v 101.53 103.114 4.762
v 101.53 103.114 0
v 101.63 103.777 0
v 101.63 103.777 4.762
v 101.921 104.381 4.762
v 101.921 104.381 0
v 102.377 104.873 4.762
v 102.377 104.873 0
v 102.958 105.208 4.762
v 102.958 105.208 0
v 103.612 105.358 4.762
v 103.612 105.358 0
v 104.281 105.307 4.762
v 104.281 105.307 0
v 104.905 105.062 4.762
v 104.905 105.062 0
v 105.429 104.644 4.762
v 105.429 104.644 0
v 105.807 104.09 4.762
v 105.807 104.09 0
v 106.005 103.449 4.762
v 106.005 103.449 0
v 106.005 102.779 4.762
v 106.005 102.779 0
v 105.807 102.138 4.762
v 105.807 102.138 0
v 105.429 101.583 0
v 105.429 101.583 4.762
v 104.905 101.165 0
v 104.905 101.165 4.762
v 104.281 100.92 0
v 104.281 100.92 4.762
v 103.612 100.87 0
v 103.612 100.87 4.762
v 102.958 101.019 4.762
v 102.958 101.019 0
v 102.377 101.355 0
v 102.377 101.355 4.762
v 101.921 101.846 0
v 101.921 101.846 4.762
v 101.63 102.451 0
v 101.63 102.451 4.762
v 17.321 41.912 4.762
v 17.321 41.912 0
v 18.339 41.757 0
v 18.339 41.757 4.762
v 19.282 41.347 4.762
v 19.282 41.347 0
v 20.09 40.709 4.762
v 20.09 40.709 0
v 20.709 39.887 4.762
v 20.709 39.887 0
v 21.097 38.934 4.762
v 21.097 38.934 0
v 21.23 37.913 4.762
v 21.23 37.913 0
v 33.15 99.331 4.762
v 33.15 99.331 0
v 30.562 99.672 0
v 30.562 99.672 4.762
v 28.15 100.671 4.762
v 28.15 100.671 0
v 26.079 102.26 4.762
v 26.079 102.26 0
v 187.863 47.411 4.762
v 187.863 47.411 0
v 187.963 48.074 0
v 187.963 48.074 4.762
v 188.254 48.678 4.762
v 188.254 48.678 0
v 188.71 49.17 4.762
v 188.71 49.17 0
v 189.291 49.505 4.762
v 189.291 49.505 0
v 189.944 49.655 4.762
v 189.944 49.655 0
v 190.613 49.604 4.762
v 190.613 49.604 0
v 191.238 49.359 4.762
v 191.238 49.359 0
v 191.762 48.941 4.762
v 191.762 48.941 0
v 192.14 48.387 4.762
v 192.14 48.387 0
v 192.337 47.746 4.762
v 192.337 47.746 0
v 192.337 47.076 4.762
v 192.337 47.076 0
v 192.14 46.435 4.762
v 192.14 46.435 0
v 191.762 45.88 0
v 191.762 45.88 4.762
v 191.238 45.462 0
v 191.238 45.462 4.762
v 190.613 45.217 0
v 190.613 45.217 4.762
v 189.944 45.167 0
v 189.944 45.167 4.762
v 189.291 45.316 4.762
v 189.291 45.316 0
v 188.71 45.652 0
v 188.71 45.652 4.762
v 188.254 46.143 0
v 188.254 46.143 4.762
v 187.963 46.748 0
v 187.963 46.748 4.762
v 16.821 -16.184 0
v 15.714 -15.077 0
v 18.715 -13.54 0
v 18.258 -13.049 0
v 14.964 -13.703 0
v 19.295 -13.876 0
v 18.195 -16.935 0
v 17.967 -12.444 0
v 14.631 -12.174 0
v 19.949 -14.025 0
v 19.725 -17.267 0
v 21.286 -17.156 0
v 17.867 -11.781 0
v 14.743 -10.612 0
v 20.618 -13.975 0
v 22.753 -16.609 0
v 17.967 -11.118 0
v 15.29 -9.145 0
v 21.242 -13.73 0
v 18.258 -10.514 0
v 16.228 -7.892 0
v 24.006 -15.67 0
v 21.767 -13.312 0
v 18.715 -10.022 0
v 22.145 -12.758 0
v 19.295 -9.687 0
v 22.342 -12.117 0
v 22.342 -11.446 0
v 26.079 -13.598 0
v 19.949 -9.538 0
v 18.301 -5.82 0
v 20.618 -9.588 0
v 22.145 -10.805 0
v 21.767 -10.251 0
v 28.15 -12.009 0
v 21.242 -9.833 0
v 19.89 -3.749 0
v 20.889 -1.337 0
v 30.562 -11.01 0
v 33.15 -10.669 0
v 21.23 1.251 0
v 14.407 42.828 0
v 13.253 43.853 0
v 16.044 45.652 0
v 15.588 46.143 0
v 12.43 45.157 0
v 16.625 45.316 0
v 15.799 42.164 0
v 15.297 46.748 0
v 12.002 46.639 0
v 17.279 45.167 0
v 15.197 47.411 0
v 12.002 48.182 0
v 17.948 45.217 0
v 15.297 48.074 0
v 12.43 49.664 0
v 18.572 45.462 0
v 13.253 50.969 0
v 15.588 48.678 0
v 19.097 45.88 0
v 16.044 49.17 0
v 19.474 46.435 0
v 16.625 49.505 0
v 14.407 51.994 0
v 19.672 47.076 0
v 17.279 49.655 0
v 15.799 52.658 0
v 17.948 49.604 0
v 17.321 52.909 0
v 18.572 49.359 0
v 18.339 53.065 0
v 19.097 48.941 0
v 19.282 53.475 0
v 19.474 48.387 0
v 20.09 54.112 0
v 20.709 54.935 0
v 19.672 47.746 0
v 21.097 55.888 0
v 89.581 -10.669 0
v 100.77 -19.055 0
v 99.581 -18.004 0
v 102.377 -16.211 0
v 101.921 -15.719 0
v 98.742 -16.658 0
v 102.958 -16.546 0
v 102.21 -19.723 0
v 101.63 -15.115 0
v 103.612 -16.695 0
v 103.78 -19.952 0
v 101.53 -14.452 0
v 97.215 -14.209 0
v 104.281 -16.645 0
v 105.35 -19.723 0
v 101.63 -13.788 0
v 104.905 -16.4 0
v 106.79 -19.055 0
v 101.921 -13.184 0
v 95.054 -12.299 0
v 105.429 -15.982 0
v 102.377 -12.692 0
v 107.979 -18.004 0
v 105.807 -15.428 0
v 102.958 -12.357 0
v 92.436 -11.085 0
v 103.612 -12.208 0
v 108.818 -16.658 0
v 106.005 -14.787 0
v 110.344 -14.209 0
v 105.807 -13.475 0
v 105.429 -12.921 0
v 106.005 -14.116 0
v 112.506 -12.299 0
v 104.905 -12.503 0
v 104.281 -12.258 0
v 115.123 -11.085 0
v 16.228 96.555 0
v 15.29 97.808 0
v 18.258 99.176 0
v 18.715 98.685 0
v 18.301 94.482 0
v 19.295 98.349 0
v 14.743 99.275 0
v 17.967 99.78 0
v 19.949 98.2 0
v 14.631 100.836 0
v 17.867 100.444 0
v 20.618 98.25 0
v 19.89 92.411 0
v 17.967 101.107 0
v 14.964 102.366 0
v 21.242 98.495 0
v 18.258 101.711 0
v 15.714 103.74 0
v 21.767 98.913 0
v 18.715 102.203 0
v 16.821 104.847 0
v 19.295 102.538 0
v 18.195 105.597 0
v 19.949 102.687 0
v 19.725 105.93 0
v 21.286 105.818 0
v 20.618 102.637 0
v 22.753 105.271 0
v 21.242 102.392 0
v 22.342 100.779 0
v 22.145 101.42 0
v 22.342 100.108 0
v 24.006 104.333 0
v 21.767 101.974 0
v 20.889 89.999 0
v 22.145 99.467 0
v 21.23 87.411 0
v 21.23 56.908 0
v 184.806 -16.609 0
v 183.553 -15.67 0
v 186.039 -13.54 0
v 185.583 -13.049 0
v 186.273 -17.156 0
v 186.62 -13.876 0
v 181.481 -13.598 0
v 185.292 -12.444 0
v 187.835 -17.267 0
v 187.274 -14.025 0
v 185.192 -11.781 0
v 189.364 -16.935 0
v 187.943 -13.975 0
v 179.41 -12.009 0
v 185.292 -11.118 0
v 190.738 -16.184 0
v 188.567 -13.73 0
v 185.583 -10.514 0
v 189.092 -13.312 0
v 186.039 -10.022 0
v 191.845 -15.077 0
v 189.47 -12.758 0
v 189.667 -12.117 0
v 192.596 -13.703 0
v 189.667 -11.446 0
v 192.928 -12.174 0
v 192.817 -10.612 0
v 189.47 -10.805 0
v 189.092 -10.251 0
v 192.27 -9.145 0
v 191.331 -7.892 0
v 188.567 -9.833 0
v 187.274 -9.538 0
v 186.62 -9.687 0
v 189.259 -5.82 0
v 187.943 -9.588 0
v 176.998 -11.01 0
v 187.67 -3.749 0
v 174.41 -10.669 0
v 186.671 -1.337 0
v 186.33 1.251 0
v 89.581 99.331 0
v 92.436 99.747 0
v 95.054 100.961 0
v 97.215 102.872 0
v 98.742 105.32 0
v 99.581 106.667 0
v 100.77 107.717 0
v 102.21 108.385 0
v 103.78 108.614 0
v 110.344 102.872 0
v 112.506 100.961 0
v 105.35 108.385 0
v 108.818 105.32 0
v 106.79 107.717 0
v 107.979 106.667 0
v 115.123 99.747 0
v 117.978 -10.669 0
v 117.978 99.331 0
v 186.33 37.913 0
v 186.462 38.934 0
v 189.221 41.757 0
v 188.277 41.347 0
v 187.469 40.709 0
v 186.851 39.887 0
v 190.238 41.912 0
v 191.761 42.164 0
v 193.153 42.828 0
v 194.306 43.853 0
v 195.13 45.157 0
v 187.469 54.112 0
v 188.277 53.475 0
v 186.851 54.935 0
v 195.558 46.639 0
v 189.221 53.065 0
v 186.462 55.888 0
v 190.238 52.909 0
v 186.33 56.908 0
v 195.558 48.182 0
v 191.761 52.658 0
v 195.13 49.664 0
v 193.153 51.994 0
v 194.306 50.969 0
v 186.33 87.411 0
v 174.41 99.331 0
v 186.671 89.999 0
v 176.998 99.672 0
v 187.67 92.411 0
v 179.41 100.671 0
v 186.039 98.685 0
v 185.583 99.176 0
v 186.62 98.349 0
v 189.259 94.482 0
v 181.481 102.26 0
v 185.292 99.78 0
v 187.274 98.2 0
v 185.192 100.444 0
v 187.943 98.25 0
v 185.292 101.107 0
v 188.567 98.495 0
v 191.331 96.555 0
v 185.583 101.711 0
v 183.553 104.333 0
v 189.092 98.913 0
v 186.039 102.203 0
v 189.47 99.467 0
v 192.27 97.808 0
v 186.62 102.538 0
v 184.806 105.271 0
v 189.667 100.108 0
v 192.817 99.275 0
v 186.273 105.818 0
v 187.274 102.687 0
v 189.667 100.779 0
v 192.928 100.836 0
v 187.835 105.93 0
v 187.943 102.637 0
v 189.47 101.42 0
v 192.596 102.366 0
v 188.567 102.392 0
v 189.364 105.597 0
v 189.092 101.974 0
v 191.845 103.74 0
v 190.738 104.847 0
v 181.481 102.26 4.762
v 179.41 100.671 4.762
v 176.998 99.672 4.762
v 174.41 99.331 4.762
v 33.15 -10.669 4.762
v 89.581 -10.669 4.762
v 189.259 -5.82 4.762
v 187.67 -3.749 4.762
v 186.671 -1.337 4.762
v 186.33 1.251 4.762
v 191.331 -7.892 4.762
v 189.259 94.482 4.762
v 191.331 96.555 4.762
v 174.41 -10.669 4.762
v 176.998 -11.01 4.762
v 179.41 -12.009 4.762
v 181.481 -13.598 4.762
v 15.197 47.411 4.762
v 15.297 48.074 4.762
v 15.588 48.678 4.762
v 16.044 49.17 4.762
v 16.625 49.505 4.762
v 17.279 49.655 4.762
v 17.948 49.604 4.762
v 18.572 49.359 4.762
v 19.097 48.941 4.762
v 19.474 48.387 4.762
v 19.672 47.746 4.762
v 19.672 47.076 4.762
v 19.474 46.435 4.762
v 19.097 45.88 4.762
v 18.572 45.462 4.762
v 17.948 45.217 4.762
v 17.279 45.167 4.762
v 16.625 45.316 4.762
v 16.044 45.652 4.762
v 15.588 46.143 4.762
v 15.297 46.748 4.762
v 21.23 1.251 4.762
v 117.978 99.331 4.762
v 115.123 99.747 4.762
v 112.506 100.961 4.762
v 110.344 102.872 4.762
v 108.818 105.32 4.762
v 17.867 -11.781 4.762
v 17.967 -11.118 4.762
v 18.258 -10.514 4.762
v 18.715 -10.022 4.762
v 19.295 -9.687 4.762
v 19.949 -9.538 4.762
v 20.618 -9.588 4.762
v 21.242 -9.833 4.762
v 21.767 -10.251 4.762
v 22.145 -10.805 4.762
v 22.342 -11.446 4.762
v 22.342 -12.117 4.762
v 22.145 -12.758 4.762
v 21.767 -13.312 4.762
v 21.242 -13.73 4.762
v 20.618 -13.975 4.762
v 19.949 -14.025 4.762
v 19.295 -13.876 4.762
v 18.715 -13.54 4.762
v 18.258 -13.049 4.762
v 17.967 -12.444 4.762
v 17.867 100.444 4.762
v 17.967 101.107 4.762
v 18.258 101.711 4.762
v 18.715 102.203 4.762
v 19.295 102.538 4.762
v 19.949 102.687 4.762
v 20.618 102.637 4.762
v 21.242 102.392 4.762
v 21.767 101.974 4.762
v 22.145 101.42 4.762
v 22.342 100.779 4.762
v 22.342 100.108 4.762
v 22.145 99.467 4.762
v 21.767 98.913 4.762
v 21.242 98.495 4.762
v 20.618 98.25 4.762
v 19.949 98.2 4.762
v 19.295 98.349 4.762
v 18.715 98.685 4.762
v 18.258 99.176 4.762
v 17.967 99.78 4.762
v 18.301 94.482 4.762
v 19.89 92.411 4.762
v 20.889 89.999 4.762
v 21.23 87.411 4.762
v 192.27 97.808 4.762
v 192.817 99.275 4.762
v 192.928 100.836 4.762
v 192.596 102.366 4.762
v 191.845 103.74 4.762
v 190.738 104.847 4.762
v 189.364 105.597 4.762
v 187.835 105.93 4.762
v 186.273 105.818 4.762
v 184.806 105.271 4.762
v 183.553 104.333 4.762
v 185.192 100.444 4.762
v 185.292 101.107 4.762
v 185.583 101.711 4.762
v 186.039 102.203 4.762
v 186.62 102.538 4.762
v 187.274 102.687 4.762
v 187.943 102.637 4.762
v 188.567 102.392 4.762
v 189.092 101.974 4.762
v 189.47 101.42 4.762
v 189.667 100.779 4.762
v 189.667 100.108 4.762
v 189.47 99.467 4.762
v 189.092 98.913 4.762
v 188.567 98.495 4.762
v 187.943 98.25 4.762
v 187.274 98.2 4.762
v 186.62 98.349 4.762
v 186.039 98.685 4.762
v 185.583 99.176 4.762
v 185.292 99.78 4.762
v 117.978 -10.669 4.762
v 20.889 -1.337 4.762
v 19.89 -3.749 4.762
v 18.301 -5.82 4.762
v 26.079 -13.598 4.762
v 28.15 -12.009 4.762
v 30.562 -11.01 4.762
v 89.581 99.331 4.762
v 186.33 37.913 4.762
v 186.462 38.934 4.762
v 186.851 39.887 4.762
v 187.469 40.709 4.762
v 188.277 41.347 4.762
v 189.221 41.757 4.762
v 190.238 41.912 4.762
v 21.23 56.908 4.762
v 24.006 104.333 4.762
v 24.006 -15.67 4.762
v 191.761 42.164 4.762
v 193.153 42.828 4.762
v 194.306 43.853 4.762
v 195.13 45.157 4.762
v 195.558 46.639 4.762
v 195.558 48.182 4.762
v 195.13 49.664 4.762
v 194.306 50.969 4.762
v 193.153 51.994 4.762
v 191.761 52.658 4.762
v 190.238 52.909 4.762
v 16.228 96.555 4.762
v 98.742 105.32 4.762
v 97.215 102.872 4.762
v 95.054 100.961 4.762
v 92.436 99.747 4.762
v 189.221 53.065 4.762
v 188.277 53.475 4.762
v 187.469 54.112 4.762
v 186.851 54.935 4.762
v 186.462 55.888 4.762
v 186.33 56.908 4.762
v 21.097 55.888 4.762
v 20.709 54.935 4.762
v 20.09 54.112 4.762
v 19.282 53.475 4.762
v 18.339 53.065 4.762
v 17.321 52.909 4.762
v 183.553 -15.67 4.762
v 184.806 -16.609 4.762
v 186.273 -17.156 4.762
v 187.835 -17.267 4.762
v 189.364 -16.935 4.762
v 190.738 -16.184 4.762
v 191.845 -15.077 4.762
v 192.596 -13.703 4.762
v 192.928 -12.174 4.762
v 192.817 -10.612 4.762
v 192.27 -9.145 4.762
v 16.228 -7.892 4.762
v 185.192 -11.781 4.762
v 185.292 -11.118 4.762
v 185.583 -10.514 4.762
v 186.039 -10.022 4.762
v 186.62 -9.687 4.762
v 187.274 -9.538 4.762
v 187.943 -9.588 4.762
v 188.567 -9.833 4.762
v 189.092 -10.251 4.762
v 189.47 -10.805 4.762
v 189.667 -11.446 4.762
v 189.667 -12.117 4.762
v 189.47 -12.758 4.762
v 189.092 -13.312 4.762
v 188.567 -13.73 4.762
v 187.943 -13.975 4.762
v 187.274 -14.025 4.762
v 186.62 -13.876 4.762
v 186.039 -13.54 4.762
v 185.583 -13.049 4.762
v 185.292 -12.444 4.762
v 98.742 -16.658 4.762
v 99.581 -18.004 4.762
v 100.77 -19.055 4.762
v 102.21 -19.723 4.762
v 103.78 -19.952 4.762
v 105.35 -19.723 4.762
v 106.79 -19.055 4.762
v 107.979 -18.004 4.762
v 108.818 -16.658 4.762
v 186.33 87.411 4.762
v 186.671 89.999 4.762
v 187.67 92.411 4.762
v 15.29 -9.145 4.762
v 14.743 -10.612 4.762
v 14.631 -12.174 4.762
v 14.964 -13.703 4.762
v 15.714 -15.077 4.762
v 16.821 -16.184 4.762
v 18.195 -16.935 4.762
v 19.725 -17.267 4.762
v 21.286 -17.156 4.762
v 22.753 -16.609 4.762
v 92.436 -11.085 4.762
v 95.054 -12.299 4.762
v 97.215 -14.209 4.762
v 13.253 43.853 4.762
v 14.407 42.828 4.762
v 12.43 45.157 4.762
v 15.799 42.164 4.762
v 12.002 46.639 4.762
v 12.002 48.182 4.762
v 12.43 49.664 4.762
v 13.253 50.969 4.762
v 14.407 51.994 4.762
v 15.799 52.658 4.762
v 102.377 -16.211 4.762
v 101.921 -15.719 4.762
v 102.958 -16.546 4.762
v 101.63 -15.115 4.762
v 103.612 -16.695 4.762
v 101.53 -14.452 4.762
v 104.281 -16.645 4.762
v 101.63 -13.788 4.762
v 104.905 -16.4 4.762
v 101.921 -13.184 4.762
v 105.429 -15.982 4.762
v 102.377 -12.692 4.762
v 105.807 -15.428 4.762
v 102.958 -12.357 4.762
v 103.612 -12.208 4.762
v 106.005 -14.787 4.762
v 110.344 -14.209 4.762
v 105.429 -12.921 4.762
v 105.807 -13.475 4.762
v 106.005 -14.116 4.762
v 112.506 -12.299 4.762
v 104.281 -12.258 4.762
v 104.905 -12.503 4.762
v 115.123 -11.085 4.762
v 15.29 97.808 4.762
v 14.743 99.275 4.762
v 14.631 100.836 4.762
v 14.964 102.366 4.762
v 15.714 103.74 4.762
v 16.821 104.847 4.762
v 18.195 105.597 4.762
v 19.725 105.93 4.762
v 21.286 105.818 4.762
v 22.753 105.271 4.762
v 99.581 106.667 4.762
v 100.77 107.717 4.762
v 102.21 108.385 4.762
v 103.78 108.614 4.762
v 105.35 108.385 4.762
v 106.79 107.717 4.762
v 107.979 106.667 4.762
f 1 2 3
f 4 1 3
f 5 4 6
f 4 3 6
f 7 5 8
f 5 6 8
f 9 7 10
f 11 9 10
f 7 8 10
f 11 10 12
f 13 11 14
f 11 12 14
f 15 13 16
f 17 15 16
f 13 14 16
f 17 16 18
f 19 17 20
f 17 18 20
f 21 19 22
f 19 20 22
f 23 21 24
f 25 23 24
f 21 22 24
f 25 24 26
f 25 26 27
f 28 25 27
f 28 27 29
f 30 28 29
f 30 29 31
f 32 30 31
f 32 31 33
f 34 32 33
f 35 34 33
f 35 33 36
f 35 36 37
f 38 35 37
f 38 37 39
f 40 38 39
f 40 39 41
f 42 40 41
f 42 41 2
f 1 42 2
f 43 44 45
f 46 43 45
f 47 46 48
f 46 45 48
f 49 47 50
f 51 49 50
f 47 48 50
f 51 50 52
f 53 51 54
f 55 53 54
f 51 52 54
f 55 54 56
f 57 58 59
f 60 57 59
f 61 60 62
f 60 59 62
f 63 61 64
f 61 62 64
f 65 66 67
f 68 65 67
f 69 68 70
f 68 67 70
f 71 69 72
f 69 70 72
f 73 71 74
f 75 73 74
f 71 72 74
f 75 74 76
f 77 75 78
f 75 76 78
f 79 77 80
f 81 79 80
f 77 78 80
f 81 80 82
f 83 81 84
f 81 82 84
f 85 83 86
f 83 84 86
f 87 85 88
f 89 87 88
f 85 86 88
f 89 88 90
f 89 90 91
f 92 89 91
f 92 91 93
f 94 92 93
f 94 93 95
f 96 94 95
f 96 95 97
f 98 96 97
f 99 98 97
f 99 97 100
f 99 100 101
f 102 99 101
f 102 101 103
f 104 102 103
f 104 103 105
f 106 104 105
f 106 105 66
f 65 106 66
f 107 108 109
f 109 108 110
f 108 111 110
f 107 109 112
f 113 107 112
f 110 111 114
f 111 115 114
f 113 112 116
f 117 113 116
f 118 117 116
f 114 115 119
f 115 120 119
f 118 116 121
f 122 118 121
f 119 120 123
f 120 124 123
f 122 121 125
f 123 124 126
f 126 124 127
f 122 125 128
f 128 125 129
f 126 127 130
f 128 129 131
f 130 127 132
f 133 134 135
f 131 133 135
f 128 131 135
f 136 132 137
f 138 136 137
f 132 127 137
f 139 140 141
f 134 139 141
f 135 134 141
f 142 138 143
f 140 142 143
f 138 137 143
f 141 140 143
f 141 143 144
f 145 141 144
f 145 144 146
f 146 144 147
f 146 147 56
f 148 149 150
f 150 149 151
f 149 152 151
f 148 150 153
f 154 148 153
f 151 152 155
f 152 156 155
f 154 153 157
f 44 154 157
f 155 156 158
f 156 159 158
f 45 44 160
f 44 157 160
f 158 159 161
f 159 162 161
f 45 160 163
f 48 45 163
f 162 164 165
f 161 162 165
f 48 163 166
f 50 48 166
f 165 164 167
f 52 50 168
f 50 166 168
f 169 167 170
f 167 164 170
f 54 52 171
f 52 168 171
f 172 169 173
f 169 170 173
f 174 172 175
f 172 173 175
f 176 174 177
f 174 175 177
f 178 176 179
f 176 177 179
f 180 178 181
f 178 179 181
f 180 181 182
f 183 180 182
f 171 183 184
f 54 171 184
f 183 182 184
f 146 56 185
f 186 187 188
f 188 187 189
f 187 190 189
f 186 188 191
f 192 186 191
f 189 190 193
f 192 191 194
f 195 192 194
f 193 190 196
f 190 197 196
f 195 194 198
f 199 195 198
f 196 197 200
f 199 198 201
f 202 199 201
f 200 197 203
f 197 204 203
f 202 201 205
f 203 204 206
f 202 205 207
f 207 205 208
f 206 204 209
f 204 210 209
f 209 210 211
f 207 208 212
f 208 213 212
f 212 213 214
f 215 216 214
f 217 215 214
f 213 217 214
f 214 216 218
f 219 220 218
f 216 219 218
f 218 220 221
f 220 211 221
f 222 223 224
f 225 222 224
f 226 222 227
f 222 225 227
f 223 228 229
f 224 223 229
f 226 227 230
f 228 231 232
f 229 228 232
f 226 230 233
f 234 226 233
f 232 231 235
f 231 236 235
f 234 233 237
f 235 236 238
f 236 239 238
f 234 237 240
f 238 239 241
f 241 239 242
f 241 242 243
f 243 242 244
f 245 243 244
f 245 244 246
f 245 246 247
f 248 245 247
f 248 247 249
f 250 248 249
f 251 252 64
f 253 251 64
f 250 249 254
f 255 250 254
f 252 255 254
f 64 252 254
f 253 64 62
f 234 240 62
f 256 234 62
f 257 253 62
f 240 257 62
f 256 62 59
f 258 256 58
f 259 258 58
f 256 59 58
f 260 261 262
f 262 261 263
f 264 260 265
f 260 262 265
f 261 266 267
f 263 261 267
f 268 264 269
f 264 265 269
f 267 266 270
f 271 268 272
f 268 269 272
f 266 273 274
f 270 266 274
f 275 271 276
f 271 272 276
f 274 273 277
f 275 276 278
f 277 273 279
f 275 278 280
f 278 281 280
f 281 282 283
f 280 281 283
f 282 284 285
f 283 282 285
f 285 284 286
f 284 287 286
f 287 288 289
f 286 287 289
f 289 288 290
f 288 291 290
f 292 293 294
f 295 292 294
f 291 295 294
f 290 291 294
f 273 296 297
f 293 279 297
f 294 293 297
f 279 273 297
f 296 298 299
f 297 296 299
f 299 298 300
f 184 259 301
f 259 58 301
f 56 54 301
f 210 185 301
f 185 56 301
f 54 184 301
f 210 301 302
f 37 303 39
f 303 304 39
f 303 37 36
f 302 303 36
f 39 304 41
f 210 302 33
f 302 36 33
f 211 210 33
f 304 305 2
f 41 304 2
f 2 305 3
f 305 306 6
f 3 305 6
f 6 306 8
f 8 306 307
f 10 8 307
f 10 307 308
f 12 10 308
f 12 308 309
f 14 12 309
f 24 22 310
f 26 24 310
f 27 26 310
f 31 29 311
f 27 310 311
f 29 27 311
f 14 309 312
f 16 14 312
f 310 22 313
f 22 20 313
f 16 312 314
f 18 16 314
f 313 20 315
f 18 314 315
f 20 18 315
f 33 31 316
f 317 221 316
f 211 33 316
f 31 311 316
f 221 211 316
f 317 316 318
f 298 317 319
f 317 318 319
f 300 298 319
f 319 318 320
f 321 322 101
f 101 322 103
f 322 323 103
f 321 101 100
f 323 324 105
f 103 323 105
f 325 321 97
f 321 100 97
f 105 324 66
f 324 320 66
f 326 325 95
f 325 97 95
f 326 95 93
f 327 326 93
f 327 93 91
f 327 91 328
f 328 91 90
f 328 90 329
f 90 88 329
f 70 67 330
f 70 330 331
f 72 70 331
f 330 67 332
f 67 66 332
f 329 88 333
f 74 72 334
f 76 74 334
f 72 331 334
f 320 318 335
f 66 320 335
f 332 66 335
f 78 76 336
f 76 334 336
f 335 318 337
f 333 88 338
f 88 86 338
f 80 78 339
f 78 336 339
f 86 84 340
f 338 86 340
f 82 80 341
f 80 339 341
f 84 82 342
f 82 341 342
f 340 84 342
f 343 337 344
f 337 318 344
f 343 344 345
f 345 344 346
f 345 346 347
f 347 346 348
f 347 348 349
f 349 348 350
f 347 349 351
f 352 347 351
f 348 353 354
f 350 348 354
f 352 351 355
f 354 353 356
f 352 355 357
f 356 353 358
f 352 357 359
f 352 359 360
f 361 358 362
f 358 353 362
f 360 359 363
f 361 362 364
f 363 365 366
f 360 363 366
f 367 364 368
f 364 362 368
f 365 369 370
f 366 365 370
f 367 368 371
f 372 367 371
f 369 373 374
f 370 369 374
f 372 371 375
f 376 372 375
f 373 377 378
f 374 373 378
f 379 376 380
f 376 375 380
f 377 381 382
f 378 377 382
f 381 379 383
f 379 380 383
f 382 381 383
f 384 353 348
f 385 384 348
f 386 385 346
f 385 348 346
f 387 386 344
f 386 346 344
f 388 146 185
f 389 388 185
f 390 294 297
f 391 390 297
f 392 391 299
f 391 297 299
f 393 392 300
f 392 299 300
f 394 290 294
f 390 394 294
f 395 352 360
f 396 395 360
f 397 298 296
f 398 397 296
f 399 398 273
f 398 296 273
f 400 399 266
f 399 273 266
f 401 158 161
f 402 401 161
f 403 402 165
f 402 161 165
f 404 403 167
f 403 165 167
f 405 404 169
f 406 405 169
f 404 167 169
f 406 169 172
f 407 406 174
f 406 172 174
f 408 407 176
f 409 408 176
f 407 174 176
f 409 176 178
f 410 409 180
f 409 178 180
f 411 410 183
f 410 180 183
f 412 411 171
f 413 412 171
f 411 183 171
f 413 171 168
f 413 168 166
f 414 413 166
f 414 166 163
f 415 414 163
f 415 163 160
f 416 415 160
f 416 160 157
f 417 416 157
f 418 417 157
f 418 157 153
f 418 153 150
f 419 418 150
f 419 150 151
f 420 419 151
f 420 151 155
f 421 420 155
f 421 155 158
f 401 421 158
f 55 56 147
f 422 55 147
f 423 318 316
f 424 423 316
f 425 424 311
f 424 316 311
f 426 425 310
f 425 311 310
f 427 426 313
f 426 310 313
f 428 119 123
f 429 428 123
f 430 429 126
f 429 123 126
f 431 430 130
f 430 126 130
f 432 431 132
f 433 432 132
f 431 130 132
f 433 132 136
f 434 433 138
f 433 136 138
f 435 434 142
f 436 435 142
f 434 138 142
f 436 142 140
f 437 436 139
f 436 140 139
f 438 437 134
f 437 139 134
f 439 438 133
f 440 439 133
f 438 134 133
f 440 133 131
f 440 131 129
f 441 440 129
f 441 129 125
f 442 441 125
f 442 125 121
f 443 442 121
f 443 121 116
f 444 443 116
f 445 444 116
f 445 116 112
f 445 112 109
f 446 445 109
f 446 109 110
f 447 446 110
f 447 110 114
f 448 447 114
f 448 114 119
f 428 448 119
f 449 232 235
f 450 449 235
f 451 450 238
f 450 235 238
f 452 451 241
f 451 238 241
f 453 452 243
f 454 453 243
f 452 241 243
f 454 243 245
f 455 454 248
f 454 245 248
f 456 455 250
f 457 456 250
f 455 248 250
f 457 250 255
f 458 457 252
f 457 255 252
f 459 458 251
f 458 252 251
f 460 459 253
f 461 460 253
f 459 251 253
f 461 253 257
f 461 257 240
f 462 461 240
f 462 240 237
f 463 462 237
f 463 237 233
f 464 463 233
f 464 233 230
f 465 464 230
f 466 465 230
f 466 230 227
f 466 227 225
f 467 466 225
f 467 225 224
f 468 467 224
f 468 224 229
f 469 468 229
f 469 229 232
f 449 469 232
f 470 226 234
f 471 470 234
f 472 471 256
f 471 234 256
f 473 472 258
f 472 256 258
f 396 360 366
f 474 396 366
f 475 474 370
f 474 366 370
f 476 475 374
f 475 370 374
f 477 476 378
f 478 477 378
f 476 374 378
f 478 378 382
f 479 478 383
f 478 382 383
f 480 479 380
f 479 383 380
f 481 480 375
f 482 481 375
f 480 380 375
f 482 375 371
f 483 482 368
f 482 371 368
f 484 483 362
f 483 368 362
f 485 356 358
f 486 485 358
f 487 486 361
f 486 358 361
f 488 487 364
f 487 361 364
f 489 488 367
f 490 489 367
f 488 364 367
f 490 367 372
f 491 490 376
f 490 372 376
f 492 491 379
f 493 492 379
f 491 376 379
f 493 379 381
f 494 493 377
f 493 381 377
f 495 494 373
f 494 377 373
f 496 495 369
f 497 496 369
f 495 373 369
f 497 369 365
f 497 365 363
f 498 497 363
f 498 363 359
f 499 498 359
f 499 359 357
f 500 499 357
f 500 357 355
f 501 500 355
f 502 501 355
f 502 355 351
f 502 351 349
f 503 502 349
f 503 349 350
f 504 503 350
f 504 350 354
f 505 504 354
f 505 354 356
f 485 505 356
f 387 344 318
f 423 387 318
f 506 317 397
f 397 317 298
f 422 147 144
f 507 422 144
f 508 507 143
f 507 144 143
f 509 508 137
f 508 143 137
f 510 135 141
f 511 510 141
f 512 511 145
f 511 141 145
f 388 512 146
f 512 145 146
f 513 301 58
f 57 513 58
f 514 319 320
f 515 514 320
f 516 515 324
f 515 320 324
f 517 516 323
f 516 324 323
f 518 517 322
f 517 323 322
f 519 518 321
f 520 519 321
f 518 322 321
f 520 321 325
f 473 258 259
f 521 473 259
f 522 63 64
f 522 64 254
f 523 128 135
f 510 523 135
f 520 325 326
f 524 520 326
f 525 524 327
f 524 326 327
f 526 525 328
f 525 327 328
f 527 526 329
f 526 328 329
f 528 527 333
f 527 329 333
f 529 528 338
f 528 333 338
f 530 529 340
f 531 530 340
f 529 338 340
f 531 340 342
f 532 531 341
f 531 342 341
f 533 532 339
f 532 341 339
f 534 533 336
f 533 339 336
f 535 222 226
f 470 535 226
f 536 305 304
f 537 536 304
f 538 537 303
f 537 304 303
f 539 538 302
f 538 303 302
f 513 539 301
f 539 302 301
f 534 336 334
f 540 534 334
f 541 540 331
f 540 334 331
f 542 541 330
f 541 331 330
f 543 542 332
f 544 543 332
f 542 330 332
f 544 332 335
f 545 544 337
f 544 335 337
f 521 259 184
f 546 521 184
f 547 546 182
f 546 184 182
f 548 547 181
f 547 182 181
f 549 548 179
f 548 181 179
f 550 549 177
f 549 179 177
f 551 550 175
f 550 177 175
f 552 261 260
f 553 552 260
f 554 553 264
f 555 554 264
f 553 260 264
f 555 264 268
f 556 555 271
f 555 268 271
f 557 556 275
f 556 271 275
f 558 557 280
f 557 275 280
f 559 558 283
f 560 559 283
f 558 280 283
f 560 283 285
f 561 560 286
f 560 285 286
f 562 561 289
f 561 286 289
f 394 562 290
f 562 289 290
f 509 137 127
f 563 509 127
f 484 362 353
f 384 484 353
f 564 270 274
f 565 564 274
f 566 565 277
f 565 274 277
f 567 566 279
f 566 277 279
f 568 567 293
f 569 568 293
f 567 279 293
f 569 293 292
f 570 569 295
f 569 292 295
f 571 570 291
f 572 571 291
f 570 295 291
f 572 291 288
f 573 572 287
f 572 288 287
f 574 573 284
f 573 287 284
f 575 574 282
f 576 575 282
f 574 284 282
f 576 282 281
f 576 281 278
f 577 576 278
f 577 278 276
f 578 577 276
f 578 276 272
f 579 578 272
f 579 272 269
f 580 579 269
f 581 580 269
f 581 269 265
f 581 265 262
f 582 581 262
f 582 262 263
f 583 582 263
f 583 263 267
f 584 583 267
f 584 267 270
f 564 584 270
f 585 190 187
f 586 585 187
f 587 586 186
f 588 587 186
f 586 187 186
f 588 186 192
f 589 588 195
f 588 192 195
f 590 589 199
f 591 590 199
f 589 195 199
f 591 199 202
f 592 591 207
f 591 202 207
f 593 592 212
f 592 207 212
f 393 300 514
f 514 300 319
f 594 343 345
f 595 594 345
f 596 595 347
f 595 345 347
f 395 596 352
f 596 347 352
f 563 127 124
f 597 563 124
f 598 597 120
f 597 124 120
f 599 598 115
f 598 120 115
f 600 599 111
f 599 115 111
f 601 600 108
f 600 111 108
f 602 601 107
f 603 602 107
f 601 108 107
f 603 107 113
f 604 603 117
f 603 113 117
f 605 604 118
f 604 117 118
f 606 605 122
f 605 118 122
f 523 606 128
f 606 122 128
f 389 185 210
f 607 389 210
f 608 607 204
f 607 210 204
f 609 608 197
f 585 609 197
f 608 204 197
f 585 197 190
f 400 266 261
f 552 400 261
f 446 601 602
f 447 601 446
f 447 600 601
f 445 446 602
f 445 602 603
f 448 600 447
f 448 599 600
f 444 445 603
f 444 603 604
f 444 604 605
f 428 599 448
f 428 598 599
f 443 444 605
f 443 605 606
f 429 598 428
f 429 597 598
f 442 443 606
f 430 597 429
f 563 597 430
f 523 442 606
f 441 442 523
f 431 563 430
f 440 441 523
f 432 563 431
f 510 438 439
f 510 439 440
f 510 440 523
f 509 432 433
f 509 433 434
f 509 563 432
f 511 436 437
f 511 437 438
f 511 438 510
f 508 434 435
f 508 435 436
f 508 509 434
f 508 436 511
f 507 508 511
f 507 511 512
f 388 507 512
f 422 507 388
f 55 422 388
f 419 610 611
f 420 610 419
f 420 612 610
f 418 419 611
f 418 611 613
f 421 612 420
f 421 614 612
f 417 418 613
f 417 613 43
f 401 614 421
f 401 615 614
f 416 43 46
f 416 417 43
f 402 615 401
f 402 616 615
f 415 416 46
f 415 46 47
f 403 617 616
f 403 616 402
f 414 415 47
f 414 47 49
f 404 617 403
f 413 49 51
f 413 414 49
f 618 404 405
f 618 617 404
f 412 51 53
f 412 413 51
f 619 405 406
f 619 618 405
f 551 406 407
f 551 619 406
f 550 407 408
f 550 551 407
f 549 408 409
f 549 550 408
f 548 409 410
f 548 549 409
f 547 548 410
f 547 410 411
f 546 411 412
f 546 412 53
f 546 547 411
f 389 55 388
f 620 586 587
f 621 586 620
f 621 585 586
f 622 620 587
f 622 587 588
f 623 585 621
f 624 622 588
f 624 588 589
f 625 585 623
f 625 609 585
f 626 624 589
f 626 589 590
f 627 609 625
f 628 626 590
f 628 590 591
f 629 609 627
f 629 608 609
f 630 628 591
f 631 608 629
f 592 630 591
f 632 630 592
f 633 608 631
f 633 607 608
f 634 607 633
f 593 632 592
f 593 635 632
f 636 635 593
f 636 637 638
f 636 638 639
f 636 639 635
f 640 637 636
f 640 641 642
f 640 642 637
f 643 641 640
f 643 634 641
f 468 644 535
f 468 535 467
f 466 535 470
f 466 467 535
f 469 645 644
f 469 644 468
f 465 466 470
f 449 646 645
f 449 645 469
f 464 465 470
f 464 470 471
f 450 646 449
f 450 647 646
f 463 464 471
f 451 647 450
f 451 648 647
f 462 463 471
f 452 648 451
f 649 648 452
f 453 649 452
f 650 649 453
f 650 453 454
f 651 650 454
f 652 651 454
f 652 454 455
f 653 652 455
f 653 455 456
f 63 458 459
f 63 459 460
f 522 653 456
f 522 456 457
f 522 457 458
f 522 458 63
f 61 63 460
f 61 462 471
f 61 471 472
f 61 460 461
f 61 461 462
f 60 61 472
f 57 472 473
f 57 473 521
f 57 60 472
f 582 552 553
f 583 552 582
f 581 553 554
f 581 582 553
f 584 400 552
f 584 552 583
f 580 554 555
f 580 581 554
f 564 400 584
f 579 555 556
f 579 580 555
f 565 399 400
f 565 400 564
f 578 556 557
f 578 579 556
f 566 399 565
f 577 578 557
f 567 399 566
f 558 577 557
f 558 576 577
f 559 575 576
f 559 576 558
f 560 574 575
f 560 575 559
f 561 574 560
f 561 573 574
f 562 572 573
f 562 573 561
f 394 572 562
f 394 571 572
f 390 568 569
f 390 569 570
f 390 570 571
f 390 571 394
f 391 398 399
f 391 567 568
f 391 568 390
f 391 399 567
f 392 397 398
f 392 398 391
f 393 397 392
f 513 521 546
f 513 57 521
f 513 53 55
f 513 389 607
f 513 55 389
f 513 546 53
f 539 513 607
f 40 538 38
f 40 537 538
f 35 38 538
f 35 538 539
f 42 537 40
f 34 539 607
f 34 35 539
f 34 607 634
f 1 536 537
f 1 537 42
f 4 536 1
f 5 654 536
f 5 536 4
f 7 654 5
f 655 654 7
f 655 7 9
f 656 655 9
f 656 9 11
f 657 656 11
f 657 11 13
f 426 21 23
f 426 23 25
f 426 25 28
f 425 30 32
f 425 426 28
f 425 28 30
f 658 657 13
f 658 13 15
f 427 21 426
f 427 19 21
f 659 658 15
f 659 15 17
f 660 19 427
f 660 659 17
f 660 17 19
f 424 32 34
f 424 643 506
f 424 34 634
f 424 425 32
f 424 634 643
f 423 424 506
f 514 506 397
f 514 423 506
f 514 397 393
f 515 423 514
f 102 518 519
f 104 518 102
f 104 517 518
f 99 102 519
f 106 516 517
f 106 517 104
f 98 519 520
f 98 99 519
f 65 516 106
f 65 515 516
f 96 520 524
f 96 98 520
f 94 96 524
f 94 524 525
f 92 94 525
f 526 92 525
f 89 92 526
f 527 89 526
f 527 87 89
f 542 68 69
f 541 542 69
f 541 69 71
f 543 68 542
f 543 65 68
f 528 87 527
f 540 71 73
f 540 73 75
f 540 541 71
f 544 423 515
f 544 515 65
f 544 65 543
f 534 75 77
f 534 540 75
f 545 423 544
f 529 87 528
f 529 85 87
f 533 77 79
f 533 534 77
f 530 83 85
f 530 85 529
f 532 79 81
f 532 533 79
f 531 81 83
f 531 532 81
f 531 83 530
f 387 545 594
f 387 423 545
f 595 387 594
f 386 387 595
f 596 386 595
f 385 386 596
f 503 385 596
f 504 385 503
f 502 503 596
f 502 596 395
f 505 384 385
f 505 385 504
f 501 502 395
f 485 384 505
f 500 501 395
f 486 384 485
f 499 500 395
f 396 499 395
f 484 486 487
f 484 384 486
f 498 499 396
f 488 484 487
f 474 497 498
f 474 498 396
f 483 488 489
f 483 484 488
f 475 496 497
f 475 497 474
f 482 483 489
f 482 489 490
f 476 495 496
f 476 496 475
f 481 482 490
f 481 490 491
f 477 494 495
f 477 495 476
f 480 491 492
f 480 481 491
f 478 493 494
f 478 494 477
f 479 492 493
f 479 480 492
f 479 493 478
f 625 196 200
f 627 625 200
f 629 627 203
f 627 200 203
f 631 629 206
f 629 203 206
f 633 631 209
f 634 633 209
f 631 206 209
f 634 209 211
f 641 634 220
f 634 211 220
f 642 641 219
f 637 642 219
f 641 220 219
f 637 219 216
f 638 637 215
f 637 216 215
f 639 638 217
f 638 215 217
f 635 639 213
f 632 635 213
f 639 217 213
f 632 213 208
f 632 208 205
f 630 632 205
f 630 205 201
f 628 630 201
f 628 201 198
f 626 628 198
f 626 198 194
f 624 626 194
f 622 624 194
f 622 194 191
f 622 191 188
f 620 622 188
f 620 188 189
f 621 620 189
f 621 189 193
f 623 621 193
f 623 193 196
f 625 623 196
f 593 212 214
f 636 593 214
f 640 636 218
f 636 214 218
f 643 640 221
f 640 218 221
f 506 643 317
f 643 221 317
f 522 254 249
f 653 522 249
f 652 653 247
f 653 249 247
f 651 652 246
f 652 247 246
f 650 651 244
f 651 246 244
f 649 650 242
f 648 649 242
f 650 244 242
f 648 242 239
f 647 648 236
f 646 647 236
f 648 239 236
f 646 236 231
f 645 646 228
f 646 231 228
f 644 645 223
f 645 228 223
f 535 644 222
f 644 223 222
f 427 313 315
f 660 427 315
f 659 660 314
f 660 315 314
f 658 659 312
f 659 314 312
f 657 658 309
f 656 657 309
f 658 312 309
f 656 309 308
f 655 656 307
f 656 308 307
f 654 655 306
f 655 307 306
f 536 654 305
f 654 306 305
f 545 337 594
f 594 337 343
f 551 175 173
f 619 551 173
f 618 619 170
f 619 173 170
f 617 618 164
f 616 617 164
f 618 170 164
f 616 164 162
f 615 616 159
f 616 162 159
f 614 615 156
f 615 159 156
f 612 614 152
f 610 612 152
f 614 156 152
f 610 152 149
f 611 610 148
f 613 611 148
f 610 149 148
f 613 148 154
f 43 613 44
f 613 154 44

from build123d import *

# Parameters (mm, degrees)
BOSS_EXTRUDE1_DEPTH  = 4.7625
M4_CLEARANCE_HOLE1_D = 4.5


with BuildPart() as part:
    # Sketch2 → Boss-Extrude1 (new body)
    with BuildSketch(Plane.XY):
        with BuildLine():
            Line((183.553261784, 104.332754576), (181.480626284, 102.260119075))
            ThreePointArc((181.480626284, 102.260119075), (178.236392795, 100.092391562), (174.409558472, 99.331186887))
            Line((174.409558472, 99.331186887), (117.978290457, 99.331186887))
            ThreePointArc((117.978290457, 99.331186887), (112.506161662, 100.961252213), (108.818018348, 105.320025597))
            ThreePointArc((108.818018348, 105.320025597), (103.779868689, 108.613886887), (98.741719029, 105.320025597))
            ThreePointArc((98.741719029, 105.320025597), (95.053575715, 100.961252213), (89.58144692, 99.331186887))
            Line((89.58144692, 99.331186887), (33.150178905, 99.331186887))
            ThreePointArc((33.150178905, 99.331186887), (29.323344582, 100.092391562), (26.079111093, 102.260119075))
            Line((26.079111093, 102.260119075), (24.006475593, 104.332754576))
            ThreePointArc((24.006475593, 104.332754576), (16.228301, 104.332754576), (16.228301, 96.554579982))
            Line((16.228301, 96.554579982), (18.3009365, 94.481944482))
            ThreePointArc((18.3009365, 94.481944482), (20.468664014, 91.237710994), (21.229868689, 87.41087667))
            Line((21.229868689, 87.41087667), (21.229868689, 56.908391119))
            ThreePointArc((21.229868689, 56.908391119), (20.090461192, 54.112499396), (17.321363425, 52.909437667))
            ThreePointArc((17.321363425, 52.909437667), (11.947168689, 47.41087667), (17.321363425, 41.912315673))
            ThreePointArc((17.321363425, 41.912315673), (20.090461192, 40.709253944), (21.229868689, 37.913362221))
            Line((21.229868689, 37.913362221), (21.229868689, 1.251497104))
            ThreePointArc((21.229868689, 1.251497104), (20.468664014, -2.57533722), (18.3009365, -5.819570708))
            Line((18.3009365, -5.819570708), (16.228301, -7.892206209))
            ThreePointArc((16.228301, -7.892206209), (16.228301, -15.670380802), (24.006475593, -15.670380802))
            Line((24.006475593, -15.670380802), (26.079111093, -13.597745301))
            ThreePointArc((26.079111093, -13.597745301), (29.323344582, -11.430017788), (33.150178905, -10.668813113))
            Line((33.150178905, -10.668813113), (89.58144692, -10.668813113))
            ThreePointArc((89.58144692, -10.668813113), (95.053575715, -12.298878439), (98.741719029, -16.657651823))
            ThreePointArc((98.741719029, -16.657651823), (103.779868689, -19.951513113), (108.818018348, -16.657651823))
            ThreePointArc((108.818018348, -16.657651823), (112.506161662, -12.298878439), (117.978290457, -10.668813113))
            Line((117.978290457, -10.668813113), (174.409558472, -10.668813113))
            ThreePointArc((174.409558472, -10.668813113), (178.236392795, -11.430017788), (181.480626284, -13.597745301))
            Line((181.480626284, -13.597745301), (183.553261784, -15.670380802))
            ThreePointArc((183.553261784, -15.670380802), (191.331436377, -15.670380802), (191.331436377, -7.892206209))
            Line((191.331436377, -7.892206209), (189.258800877, -5.819570708))
            ThreePointArc((189.258800877, -5.819570708), (187.091073363, -2.57533722), (186.329868689, 1.251497104))
            Line((186.329868689, 1.251497104), (186.329868689, 37.913362221))
            ThreePointArc((186.329868689, 37.913362221), (187.469276185, 40.709253944), (190.238373952, 41.912315673))
            ThreePointArc((190.238373952, 41.912315673), (195.612568689, 47.41087667), (190.238373952, 52.909437667))
            ThreePointArc((190.238373952, 52.909437667), (187.469276185, 54.112499396), (186.329868689, 56.908391119))
            Line((186.329868689, 56.908391119), (186.329868689, 87.41087667))
            ThreePointArc((186.329868689, 87.41087667), (187.091073363, 91.237710994), (189.258800877, 94.481944482))
            Line((189.258800877, 94.481944482), (191.331436377, 96.554579982))
            ThreePointArc((191.331436377, 96.554579982), (191.331436377, 104.332754576), (183.553261784, 104.332754576))
        make_face()
    extrude(amount=BOSS_EXTRUDE1_DEPTH)

    # M4 Clearance Hole1 (through all)
    with Locations(Plane.XY.offset(4.7625)):
        with Locations((17.447168689, 47.41087667), (20.117388296, 100.443667279), (103.779868689, 103.113886887), (187.442349081, 100.443667279), (190.112568689, 47.41087667), (187.442349081, -11.781293505), (103.779868689, -14.451513113), (20.117388296, -11.781293505)):
            Hole(M4_CLEARANCE_HOLE1_D / 2)


solid = part.part
